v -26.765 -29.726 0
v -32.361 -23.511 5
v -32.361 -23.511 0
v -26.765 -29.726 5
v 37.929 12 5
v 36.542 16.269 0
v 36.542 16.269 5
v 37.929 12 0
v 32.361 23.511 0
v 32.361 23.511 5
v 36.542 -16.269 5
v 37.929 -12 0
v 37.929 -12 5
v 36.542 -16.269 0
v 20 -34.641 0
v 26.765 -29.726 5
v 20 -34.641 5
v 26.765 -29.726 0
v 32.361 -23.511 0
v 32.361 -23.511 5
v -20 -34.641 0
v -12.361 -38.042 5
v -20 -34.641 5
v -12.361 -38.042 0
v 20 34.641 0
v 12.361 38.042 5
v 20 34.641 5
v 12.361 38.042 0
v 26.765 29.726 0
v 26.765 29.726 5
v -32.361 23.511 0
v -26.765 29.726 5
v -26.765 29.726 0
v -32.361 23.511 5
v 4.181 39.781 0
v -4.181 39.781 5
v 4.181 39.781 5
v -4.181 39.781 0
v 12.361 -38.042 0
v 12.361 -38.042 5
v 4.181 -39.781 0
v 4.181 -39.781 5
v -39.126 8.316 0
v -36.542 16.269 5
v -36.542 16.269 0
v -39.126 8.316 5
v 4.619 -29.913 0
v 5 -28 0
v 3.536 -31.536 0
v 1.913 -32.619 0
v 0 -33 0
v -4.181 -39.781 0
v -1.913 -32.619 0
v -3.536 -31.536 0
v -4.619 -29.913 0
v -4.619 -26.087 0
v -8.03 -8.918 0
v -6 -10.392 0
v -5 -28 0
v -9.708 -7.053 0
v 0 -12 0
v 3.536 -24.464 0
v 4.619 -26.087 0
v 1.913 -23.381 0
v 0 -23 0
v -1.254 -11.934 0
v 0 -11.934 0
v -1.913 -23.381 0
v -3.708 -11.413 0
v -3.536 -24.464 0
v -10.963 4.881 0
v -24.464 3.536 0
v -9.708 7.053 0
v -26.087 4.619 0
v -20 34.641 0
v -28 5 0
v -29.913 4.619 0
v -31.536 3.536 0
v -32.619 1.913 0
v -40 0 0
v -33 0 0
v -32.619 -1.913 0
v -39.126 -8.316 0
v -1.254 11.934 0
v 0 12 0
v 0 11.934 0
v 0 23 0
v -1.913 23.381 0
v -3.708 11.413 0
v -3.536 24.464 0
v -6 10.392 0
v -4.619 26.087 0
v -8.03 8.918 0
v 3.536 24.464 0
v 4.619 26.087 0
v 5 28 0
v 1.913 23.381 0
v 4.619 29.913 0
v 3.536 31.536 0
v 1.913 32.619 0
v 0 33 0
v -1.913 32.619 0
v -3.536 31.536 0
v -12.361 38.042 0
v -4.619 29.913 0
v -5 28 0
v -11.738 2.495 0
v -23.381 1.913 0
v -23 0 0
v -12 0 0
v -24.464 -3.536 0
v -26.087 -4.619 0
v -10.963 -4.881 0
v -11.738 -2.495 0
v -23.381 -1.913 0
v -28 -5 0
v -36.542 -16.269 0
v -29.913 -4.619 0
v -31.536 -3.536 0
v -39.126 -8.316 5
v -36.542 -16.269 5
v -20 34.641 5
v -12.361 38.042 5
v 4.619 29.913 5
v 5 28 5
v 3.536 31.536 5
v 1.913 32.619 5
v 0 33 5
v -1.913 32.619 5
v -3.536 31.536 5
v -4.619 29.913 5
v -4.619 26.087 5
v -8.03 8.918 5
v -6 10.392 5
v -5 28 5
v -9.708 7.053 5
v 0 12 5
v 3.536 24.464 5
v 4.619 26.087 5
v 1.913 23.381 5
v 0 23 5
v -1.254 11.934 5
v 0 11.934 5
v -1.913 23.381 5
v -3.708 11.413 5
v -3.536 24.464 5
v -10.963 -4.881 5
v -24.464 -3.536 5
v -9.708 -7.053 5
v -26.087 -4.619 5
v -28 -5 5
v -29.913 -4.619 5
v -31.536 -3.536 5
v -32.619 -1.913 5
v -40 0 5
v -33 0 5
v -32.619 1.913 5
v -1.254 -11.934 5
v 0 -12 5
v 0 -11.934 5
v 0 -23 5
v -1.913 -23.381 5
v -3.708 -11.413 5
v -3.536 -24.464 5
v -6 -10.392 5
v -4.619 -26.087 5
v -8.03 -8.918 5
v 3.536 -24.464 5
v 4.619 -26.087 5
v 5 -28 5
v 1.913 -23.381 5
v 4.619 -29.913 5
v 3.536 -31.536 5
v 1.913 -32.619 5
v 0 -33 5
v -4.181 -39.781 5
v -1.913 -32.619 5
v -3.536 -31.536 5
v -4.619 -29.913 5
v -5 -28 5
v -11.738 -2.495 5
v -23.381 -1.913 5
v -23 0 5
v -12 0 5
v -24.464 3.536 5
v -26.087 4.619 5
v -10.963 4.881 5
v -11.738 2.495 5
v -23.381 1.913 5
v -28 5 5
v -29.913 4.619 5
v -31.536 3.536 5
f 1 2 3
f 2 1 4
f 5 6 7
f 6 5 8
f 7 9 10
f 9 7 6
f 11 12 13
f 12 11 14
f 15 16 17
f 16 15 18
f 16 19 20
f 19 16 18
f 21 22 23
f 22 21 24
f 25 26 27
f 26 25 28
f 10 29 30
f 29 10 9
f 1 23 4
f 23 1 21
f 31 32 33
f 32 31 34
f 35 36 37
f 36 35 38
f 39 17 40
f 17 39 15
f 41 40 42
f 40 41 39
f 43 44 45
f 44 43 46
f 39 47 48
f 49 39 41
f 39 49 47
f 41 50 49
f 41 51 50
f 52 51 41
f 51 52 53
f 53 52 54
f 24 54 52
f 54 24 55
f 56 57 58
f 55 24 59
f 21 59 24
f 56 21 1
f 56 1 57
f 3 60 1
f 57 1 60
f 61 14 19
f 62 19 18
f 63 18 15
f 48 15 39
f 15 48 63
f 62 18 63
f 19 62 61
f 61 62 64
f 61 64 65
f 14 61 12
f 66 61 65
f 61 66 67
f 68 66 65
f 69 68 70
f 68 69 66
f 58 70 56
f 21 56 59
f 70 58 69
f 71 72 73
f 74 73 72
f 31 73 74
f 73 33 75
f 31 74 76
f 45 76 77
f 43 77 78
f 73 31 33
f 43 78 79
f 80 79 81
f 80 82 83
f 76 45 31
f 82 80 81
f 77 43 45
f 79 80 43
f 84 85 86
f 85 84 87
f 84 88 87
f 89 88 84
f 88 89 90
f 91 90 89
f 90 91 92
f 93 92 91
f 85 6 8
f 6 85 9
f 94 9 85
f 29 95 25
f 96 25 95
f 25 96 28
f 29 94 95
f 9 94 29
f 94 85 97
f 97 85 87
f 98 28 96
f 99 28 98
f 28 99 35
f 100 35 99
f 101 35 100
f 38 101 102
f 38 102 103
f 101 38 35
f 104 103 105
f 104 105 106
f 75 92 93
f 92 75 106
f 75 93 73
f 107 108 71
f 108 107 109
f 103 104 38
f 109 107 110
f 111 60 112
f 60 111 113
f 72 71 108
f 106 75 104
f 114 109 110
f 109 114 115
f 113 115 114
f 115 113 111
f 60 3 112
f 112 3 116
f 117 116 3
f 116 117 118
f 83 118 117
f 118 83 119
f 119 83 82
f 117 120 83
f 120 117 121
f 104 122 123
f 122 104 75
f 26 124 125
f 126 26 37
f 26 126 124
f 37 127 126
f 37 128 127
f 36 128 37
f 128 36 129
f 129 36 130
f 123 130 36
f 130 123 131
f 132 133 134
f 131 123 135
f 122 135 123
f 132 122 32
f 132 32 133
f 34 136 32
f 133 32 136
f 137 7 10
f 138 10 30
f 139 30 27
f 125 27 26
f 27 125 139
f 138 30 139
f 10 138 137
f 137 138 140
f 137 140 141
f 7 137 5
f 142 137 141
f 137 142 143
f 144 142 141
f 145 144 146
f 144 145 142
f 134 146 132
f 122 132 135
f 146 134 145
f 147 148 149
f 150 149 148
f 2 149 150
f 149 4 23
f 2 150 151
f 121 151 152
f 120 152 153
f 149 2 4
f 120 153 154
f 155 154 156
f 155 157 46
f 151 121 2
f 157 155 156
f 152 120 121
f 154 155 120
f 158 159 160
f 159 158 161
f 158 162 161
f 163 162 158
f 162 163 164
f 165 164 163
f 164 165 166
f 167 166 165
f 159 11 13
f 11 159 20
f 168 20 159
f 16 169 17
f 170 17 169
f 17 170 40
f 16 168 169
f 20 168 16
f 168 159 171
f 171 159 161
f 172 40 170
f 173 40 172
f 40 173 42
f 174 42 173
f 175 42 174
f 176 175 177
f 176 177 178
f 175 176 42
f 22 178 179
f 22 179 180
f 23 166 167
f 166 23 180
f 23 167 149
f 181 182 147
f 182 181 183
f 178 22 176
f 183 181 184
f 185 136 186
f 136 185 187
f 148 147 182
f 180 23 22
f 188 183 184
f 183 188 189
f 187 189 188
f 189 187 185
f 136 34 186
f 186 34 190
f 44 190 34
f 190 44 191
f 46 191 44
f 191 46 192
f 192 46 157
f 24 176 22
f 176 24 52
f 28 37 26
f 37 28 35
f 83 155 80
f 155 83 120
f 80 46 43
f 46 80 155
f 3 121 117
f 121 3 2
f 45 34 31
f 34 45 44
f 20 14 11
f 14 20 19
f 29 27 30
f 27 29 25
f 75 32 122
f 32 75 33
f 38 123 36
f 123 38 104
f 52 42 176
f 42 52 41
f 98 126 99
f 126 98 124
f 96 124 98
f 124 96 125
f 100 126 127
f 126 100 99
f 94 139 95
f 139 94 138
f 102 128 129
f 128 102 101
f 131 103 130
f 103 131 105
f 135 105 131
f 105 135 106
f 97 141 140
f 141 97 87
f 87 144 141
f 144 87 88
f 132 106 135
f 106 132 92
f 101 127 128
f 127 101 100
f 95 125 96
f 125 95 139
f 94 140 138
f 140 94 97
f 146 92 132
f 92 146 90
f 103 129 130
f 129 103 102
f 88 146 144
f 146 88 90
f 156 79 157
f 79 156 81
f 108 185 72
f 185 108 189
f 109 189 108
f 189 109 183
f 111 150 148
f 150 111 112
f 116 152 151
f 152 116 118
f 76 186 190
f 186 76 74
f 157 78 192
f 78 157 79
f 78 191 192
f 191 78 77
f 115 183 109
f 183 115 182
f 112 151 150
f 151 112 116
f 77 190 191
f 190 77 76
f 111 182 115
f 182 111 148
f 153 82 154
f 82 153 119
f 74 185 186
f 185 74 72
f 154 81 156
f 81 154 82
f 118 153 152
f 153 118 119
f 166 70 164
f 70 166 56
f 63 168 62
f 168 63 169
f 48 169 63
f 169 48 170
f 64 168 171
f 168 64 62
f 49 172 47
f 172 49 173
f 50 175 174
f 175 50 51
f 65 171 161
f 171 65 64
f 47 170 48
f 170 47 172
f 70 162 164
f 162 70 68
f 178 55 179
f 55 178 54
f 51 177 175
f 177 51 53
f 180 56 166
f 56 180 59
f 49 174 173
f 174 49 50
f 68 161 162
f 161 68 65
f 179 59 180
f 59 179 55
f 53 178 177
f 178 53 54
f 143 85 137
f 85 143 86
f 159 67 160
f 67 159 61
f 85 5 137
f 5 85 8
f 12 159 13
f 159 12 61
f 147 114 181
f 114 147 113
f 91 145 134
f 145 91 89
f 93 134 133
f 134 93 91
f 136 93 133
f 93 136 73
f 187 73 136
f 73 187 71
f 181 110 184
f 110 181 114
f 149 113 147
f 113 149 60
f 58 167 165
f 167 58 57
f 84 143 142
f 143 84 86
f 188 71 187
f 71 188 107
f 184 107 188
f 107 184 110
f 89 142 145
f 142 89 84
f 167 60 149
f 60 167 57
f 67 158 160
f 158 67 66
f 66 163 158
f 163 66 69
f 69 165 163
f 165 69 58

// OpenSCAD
difference() {
cylinder(5,d=80);

translate([0,28,0])
cylinder(12,d=10, center=true);

translate([-28,0,0])
cylinder(12,d=10, center=true);
    
translate([0,-28,0])
cylinder(12,d=10, center=true);

translate([0,-12,-1])
cube([40,24,13]);  

cylinder(12,d=24, center=true);  
    
}
